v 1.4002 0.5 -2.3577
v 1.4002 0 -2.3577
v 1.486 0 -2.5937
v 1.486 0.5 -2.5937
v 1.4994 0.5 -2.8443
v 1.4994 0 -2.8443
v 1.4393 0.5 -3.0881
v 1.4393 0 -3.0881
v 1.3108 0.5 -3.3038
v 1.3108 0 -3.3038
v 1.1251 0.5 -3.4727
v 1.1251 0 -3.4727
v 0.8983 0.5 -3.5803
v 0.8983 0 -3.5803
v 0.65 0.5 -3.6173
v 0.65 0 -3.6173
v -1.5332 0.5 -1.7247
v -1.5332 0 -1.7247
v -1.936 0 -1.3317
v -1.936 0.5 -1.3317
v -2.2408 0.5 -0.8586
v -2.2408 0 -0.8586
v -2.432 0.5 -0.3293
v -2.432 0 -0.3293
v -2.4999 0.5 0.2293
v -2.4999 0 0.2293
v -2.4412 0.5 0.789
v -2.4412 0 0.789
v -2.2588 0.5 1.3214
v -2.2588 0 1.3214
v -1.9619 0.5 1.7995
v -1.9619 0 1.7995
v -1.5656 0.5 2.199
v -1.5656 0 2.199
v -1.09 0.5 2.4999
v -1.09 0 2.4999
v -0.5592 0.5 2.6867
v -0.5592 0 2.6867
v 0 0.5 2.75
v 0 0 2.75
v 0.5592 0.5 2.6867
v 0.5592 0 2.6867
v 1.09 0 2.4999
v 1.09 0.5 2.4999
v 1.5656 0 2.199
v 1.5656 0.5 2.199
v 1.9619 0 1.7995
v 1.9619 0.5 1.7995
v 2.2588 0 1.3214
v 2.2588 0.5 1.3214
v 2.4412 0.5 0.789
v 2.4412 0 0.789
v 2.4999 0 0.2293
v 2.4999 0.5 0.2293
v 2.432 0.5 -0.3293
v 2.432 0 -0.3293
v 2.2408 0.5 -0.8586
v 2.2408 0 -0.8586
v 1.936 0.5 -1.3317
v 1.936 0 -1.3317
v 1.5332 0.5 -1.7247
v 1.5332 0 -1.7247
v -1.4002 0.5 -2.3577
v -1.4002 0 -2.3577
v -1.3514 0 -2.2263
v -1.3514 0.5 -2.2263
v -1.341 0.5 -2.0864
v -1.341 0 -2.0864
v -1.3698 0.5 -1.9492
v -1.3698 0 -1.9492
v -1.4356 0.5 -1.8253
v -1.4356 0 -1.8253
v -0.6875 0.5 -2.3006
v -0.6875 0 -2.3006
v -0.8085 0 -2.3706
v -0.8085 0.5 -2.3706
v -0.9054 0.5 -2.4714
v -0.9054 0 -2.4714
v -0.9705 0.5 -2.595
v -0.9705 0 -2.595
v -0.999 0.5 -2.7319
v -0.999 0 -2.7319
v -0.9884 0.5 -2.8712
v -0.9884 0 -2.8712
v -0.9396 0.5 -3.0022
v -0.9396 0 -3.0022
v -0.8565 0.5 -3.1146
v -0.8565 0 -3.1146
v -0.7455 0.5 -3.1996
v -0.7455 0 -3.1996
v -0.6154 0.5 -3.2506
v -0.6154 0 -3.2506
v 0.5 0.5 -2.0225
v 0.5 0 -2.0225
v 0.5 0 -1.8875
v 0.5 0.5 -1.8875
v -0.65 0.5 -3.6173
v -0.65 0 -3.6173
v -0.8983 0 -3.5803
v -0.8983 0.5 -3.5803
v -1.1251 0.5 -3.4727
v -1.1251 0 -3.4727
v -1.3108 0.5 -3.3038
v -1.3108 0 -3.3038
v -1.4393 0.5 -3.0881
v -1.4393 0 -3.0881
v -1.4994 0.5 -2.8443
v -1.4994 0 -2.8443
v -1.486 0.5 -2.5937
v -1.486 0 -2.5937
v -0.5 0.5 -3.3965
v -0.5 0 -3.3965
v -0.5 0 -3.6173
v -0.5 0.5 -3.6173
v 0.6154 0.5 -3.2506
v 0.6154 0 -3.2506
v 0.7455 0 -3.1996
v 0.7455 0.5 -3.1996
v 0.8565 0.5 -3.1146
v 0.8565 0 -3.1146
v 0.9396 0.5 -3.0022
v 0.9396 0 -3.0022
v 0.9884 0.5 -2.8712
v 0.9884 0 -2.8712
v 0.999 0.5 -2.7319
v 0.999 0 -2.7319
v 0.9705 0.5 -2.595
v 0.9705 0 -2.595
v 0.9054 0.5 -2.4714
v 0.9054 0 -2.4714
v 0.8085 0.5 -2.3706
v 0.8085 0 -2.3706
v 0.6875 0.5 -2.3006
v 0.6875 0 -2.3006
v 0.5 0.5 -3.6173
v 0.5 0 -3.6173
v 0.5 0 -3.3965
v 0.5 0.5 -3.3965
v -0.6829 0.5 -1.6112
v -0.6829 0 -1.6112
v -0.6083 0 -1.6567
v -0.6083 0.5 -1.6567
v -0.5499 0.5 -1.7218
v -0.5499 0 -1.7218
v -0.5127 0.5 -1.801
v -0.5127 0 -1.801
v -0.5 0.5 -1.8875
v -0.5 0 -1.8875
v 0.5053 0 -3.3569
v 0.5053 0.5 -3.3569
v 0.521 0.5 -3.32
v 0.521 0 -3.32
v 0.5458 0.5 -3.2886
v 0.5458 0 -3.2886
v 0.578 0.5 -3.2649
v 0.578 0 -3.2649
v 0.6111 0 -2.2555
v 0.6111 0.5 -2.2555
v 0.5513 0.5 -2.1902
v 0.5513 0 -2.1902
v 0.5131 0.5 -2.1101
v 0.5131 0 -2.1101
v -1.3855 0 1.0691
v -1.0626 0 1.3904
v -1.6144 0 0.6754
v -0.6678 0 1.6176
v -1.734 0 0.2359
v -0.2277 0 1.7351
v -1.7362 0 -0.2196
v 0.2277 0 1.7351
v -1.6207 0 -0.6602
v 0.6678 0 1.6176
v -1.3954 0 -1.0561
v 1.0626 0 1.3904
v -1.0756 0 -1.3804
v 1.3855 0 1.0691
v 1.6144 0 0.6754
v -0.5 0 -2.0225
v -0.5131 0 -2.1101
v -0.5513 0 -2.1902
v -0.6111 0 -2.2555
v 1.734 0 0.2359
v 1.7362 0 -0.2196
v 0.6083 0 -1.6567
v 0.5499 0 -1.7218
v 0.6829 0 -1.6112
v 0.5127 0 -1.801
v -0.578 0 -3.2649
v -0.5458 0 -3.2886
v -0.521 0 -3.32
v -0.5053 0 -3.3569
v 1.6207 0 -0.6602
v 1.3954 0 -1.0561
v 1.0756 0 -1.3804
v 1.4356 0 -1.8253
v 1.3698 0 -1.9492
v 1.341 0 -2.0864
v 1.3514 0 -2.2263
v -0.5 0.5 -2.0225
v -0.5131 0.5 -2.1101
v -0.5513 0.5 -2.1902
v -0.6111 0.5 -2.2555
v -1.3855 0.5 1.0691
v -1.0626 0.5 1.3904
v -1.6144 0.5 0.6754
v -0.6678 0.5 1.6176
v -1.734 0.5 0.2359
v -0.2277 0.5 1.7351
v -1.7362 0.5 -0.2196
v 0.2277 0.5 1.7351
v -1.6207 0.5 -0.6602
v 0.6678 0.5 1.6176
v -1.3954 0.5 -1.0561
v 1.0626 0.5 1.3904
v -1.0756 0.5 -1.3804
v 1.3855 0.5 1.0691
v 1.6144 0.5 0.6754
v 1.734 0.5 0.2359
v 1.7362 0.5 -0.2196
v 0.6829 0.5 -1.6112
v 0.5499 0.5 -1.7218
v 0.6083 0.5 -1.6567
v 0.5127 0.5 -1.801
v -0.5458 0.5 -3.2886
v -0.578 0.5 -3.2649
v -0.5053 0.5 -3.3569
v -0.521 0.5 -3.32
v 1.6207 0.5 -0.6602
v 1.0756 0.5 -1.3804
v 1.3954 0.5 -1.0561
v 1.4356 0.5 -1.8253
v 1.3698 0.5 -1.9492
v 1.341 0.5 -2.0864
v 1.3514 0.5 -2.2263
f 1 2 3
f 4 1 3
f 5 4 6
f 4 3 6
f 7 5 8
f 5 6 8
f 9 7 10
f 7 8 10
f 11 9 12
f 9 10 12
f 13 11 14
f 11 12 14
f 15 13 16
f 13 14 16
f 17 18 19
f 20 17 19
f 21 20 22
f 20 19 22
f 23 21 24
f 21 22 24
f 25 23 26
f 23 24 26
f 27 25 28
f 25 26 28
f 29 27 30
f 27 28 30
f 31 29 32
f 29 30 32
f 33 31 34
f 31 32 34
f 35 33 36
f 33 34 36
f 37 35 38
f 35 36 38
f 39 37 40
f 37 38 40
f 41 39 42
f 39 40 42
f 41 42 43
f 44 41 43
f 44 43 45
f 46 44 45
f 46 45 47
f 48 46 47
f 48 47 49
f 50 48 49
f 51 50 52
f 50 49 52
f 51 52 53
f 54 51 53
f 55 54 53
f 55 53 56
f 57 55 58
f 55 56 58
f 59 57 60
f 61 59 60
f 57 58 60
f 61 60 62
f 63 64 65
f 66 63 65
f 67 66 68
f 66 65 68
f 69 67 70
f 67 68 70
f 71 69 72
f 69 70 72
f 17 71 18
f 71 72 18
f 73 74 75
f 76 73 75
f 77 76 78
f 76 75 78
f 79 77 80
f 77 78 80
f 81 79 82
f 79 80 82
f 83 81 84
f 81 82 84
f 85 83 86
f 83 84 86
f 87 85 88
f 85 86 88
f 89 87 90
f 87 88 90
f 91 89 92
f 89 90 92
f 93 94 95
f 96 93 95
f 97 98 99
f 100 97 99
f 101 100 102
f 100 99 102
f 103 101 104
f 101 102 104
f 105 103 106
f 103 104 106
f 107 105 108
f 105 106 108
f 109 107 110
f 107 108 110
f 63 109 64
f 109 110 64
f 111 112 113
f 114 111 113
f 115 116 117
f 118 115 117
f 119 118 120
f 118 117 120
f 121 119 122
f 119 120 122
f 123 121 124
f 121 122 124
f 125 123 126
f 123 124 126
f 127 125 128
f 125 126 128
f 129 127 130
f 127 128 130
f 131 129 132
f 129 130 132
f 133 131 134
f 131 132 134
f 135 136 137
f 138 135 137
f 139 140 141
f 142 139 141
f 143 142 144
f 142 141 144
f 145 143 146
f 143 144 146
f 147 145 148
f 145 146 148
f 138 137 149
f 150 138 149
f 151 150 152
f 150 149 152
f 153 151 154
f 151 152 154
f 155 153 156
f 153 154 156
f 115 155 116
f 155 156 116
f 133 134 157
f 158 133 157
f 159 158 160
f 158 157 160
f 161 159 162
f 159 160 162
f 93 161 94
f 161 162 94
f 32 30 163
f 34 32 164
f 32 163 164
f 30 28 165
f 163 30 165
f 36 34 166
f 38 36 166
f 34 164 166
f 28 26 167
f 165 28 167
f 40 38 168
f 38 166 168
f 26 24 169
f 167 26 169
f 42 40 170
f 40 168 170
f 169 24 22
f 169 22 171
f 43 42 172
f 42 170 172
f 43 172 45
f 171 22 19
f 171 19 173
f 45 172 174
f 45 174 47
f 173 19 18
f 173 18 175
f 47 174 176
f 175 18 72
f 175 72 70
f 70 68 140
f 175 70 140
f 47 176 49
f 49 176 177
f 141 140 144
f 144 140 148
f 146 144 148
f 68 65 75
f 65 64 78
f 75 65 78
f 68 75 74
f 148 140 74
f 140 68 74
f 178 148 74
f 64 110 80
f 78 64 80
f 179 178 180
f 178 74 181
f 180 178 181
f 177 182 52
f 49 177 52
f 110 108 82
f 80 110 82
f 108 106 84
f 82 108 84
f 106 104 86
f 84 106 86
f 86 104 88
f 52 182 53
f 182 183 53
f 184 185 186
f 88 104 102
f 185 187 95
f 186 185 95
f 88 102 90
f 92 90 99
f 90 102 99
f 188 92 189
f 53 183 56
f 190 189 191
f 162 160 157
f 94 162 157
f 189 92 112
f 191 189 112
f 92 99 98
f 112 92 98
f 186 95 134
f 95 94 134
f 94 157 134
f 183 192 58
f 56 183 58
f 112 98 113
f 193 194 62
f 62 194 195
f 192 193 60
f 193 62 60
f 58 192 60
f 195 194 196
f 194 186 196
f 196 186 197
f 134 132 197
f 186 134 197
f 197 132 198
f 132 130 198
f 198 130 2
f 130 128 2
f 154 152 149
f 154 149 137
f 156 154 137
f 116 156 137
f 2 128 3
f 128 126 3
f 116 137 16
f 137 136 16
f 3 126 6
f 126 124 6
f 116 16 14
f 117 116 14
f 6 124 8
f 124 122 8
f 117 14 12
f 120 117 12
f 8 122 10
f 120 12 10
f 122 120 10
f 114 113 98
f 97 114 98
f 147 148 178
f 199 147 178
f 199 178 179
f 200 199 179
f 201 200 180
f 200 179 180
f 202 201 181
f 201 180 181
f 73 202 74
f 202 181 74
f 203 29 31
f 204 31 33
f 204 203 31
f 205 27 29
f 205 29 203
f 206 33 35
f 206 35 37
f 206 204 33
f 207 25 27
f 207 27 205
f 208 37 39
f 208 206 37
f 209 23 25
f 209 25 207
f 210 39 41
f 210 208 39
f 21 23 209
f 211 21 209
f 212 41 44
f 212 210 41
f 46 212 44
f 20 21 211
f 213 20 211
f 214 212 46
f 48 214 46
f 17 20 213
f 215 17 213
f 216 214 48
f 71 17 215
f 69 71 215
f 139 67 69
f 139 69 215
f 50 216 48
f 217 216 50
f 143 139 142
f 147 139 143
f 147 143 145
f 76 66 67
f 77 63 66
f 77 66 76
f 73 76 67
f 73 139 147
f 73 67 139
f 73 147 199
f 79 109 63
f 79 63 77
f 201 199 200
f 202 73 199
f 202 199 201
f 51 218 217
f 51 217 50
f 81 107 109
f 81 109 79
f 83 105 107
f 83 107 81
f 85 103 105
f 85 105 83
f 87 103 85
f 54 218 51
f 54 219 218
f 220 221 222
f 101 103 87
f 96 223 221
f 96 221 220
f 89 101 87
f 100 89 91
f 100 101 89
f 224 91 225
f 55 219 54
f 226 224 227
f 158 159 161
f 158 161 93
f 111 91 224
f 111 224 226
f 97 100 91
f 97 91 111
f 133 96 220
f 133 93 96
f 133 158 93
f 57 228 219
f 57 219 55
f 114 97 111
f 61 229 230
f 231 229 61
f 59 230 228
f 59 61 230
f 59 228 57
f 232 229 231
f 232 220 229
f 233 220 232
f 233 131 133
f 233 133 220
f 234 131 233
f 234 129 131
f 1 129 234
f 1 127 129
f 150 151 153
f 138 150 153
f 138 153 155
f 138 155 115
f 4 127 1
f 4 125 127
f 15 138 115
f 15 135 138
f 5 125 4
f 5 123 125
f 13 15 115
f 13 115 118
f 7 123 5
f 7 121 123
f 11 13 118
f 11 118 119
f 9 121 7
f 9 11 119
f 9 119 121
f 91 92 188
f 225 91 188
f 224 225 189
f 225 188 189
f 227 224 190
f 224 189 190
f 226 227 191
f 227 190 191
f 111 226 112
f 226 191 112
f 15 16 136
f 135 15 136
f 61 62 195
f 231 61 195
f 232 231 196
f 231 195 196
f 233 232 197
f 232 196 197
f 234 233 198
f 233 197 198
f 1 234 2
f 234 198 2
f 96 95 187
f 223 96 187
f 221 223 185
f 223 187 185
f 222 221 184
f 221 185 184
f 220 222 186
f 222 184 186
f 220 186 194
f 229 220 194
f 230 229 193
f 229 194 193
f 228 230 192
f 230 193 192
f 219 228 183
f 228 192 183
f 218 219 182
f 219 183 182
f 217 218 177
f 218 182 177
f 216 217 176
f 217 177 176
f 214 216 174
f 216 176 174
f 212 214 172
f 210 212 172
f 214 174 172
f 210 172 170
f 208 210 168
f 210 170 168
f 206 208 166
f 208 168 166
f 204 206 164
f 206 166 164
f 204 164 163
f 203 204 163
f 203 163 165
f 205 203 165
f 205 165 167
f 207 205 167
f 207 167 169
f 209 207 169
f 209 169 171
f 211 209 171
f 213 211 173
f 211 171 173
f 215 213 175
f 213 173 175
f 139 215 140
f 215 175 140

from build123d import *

# Parameters (mm, degrees)
EXTRUDE_1_DEPTH = 0.5


with BuildPart() as part:
    # Эскиз1 → Бобышка-Вытянуть1 (new body)
    with BuildSketch(Plane(origin=(0, 0, 0), x_dir=(1, 0, 0), z_dir=(0, 1, 0))):
        with BuildLine():
            Line((-0.5, 3.39653489), (-0.5, 3.617269734))
            Line((-0.5, 3.617269734), (-0.65, 3.617269734))
            ThreePointArc((-0.65, 3.617269734), (-1.383018397, 3.200677396), (-1.400206292, 2.357724418))
            ThreePointArc((-1.400206292, 2.357724418), (-1.350536641, 2.016782346), (-1.533211621, 1.724654938))
            ThreePointArc((-1.533211621, 1.724654938), (0, -2.75), (1.533211621, 1.724654938))
            ThreePointArc((1.533211621, 1.724654938), (1.350536641, 2.016782346), (1.400206292, 2.357724418))
            ThreePointArc((1.400206292, 2.357724418), (1.383018397, 3.200677396), (0.65, 3.617269734))
            Line((0.65, 3.617269734), (0.5, 3.617269734))
            Line((0.5, 3.617269734), (0.5, 3.39653489))
            ThreePointArc((0.5, 3.39653489), (0.532330319, 3.303508839), (0.615384615, 3.250583613))
            ThreePointArc((0.615384615, 3.250583613), (0.998565629, 2.801925275), (0.6875, 2.300566953))
            ThreePointArc((0.6875, 2.300566953), (0.551253141, 2.190164608), (0.5, 2.022459509))
            Line((0.5, 2.022459509), (0.5, 1.887458609))
            ThreePointArc((0.5, 1.887458609), (0.549878079, 1.72181132), (0.682926829, 1.611245154))
            ThreePointArc((0.682926829, 1.611245154), (0, -1.75), (-0.682926829, 1.611245154))
            ThreePointArc((-0.682926829, 1.611245154), (-0.549878079, 1.72181132), (-0.5, 1.887458609))
            Line((-0.5, 1.887458609), (-0.5, 2.022459509))
            ThreePointArc((-0.5, 2.022459509), (-0.551253141, 2.190164608), (-0.6875, 2.300566953))
            ThreePointArc((-0.6875, 2.300566953), (-0.998565629, 2.801925275), (-0.615384615, 3.250583613))
            ThreePointArc((-0.615384615, 3.250583613), (-0.532330319, 3.303508839), (-0.5, 3.39653489))
        make_face()
    extrude(amount=EXTRUDE_1_DEPTH)


solid = part.part
